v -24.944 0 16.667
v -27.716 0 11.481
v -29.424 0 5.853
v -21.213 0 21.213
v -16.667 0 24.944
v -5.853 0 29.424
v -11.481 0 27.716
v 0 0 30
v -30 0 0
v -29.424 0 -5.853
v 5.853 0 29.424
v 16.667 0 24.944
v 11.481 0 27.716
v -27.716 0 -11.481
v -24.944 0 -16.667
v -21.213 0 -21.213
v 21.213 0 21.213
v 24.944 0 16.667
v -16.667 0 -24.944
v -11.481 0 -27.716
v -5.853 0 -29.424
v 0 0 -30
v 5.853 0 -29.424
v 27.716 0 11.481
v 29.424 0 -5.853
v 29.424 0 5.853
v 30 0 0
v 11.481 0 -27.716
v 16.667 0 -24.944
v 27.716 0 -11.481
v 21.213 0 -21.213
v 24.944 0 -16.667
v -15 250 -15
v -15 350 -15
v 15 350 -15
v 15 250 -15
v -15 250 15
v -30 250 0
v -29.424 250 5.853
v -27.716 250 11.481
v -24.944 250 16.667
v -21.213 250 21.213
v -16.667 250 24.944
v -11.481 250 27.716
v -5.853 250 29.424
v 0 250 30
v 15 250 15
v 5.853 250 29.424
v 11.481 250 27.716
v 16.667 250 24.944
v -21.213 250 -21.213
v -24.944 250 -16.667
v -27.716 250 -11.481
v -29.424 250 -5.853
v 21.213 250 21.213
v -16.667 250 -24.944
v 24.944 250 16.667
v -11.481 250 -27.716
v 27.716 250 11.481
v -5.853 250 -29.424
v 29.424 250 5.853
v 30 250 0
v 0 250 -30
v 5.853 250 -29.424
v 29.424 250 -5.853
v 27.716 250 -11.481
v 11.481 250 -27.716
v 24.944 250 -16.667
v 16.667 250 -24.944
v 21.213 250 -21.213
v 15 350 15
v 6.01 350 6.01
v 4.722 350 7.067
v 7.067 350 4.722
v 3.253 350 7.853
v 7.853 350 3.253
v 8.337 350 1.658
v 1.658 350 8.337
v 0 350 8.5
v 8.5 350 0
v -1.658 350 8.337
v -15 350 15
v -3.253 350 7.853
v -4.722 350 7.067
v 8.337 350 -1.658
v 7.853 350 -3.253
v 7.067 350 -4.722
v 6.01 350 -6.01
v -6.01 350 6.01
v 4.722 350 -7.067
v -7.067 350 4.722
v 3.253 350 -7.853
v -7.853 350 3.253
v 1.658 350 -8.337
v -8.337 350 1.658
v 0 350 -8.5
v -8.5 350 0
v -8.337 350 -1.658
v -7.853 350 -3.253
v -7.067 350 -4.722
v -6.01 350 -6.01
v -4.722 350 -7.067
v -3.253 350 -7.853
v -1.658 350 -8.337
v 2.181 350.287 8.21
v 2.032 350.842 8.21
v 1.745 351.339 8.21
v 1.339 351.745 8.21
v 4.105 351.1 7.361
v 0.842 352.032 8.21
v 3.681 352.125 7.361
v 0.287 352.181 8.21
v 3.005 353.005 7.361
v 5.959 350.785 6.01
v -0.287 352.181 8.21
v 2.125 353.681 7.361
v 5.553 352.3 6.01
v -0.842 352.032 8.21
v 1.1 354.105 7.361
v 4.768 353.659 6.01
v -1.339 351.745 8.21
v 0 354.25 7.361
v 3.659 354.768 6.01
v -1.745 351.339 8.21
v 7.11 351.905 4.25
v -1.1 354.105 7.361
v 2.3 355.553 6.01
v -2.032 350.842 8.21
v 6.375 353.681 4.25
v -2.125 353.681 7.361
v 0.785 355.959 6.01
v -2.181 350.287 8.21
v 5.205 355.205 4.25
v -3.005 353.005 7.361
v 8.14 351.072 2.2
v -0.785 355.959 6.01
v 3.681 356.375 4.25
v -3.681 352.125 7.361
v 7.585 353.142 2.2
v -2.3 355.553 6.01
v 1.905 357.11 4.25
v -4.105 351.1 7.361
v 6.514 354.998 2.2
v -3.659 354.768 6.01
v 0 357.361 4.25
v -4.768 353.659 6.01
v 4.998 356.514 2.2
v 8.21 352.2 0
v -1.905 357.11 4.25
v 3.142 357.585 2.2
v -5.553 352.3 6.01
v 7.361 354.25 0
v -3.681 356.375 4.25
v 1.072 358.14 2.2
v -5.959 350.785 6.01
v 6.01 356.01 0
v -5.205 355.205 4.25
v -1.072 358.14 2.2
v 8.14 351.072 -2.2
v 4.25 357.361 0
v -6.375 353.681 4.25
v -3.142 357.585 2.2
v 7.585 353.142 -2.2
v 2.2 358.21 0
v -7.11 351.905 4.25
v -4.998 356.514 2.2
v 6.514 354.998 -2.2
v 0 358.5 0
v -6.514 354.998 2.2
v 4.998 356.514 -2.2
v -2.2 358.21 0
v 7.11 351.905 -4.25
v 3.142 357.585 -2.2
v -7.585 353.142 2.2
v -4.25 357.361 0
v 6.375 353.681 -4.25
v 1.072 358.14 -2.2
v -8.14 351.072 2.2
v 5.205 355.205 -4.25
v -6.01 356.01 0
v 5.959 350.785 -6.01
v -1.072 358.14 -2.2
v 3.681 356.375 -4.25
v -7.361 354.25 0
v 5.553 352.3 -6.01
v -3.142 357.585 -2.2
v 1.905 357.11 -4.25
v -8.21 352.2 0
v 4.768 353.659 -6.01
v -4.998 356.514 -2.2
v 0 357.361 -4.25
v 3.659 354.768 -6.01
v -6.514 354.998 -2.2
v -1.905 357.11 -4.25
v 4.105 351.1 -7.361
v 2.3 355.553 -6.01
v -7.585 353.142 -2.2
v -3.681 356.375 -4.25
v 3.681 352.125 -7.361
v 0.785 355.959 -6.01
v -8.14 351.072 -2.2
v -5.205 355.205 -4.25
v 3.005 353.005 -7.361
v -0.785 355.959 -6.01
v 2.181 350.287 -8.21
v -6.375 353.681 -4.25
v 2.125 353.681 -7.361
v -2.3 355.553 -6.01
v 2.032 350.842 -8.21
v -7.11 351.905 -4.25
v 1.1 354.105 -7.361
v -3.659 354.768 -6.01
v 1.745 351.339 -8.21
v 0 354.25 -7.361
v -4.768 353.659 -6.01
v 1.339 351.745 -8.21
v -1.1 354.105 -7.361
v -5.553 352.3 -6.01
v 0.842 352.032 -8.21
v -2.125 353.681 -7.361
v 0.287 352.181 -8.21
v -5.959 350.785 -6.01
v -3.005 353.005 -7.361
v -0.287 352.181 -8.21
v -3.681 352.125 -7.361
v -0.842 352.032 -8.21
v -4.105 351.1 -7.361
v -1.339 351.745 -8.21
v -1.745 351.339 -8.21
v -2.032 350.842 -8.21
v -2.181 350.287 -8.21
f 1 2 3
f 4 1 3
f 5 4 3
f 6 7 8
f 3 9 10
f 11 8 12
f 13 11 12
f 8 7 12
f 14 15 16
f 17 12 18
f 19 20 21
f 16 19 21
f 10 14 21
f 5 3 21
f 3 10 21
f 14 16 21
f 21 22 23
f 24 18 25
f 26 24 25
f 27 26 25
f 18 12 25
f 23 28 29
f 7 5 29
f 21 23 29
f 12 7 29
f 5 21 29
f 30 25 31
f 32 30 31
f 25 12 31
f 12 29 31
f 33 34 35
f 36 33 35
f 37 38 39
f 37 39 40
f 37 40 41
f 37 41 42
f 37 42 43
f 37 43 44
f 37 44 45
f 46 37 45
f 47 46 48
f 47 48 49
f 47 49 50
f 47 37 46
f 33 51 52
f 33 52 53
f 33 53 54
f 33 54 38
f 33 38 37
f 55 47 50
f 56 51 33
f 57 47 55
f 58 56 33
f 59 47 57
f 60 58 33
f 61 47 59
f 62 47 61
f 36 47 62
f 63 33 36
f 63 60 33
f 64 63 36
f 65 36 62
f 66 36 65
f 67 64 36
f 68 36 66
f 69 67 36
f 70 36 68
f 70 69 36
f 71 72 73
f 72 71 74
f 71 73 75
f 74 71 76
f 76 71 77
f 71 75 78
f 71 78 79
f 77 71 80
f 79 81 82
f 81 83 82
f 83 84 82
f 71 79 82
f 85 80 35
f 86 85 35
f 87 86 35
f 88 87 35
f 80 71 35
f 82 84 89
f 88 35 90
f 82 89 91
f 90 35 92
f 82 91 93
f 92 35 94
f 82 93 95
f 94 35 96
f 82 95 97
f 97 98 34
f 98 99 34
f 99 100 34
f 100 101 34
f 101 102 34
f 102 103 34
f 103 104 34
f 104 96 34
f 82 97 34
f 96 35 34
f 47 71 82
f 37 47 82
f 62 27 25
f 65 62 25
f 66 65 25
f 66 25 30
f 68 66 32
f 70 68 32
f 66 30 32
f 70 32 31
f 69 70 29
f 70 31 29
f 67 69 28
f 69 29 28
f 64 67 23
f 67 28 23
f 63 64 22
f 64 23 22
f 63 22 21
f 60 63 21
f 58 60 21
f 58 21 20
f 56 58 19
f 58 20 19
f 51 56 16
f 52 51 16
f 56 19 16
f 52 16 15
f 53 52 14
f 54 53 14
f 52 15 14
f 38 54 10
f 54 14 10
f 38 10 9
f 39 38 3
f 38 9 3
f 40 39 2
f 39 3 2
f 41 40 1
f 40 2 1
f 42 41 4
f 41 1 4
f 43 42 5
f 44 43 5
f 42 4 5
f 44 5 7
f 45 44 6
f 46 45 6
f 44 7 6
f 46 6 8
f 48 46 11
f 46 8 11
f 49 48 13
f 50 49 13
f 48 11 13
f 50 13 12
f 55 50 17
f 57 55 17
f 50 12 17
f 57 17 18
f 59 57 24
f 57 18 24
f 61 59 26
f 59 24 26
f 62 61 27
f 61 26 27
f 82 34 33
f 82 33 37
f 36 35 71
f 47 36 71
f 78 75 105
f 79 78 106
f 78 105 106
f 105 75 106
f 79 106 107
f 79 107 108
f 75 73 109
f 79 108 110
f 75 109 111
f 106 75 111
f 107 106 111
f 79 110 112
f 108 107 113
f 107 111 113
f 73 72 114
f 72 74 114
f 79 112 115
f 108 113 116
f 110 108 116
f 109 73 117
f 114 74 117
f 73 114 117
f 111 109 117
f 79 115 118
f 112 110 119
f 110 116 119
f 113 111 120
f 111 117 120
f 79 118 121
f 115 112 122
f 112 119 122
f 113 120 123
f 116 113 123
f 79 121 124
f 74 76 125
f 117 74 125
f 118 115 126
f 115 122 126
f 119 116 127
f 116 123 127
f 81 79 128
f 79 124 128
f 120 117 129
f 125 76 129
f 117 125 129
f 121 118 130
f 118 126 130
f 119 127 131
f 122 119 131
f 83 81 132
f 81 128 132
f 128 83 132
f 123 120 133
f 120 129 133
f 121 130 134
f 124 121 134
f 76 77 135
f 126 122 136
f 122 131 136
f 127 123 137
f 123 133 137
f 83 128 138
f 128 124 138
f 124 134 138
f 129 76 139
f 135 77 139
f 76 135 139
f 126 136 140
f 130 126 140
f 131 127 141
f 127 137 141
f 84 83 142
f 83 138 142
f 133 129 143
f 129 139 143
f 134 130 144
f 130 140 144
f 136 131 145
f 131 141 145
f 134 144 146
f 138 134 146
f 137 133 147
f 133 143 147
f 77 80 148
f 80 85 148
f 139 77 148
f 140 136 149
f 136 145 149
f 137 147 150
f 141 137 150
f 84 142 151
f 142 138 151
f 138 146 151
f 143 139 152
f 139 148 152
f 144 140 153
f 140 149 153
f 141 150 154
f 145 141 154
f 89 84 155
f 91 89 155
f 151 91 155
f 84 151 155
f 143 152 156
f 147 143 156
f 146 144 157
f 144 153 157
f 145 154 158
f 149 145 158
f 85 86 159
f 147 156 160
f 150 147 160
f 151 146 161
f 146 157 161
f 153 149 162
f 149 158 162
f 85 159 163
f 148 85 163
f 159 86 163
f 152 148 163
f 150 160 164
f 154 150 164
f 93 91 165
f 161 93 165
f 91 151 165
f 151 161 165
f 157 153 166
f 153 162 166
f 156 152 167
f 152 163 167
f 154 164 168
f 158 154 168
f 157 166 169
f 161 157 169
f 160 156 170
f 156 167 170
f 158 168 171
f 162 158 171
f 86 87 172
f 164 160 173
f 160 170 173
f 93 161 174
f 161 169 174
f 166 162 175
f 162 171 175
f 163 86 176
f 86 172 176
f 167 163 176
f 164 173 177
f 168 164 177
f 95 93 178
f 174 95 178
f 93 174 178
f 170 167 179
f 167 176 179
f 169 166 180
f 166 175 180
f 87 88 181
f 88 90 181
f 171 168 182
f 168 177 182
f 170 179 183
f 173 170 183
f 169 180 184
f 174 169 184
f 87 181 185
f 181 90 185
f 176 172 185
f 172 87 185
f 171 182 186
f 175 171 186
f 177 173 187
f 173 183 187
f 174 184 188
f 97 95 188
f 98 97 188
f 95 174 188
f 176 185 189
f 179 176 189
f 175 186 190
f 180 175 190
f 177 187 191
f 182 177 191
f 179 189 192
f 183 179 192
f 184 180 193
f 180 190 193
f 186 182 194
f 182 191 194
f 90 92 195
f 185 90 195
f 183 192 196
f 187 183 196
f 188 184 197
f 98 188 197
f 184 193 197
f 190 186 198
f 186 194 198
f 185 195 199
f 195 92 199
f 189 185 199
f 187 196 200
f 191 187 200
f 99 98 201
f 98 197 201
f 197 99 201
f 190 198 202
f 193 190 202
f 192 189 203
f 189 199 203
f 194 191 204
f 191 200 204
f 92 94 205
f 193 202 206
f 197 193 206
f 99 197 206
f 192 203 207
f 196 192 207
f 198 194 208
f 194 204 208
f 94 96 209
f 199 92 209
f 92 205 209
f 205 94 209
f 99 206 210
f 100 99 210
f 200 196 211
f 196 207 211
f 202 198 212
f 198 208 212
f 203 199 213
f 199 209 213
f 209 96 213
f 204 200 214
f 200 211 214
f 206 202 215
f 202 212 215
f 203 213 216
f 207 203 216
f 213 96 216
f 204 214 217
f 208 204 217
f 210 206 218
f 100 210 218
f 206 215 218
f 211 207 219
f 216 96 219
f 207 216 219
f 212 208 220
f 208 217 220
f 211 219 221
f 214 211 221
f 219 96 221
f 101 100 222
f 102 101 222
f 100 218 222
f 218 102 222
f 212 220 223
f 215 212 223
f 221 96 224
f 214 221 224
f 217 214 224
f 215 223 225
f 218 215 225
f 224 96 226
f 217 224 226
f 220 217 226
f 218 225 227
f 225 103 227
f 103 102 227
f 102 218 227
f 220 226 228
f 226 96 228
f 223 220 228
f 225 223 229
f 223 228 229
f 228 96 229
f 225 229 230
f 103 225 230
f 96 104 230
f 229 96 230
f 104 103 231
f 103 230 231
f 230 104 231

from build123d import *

# Parameters (mm, degrees)
SKETCH1_R           = 30
BOSS_EXTRUDE1_DEPTH = 250
BOSS_EXTRUDE2_DEPTH = 100


with BuildPart() as part:
    # Sketch1 → Boss-Extrude1 (new body)
    with BuildSketch(Plane(origin=(0, 0, 0), x_dir=(1, 0, 0), z_dir=(0, 1, 0))):
        Circle(SKETCH1_R)
    extrude(amount=BOSS_EXTRUDE1_DEPTH)

    # Sketch3 → Boss-Extrude2 (add)
    with BuildSketch(Plane(origin=(0, 250, 0), x_dir=(1, 0, 0), z_dir=(0, 1, 0))):
        Polygon((-15, 0.769018566), (-15, 15), (15, 15), (15, -15), (-15, -15), align=None)
    extrude(amount=BOSS_EXTRUDE2_DEPTH)

    # Sketch4 → Revolve1 (revolve)
    with BuildSketch(Plane(origin=(0, 350, 0), x_dir=(1, 0, 0), z_dir=(0, 1, 0))):
        with BuildLine():
            Line((0, 8.5), (0, -8.5))
            ThreePointArc((0, -8.5), (8.5, 0), (0, 8.5))
        make_face()
    revolve(axis=Axis((0, 350, -8.5), (0, 0, 1)))


solid = part.part
